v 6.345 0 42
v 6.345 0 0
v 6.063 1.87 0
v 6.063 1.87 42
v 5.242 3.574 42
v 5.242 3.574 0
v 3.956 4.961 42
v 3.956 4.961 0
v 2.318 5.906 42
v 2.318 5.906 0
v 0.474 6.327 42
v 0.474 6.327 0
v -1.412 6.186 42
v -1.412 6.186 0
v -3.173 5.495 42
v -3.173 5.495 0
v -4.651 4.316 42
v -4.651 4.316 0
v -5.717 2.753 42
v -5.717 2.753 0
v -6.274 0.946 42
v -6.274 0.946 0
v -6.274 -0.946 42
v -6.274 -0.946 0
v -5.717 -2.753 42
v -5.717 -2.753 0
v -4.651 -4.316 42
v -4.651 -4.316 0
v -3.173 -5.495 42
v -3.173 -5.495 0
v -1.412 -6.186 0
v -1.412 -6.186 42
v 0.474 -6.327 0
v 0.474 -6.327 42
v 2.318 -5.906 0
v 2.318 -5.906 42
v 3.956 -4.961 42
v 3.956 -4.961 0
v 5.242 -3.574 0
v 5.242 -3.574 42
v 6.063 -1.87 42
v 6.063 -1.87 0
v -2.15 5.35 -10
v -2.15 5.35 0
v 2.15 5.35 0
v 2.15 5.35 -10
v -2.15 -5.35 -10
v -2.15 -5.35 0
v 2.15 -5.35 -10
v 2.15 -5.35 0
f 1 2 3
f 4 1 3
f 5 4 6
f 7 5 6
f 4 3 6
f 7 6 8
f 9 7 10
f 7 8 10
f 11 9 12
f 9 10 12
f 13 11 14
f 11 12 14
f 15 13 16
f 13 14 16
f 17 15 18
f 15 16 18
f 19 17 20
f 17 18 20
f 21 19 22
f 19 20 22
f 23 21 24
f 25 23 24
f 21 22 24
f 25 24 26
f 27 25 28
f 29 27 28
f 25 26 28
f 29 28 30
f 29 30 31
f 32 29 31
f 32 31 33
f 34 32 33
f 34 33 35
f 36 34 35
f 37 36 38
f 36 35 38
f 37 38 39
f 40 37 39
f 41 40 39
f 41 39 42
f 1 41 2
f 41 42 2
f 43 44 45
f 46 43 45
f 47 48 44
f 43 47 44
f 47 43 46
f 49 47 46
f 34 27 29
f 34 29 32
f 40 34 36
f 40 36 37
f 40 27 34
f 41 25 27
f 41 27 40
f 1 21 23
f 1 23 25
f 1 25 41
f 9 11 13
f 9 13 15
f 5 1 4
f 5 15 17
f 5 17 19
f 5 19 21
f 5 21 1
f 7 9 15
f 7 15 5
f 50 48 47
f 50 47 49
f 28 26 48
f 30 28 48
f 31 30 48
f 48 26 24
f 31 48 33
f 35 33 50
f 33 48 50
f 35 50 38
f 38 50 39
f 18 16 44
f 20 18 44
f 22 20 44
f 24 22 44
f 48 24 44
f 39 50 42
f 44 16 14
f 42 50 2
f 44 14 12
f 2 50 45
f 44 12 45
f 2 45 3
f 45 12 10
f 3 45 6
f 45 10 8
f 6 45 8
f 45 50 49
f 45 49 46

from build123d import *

# Parameters (mm, degrees)
F0_R     = 6.345
F0_W     = 4.3
F0_H     = 10.7
F1_DEPTH = 42
F2_DEPTH = 10


with BuildPart() as f1:
    # F0 (on Top) → F1 (new body)
    with BuildSketch(Plane.XY):
        Circle(F0_R)
        Rectangle(F0_W, F0_H, mode=Mode.SUBTRACT)
        Rectangle(F0_W, F0_H)
    extrude(amount=F1_DEPTH)

    # F0 (on Top) → F2 (join)
    with BuildSketch(Plane.XY):
        Rectangle(F0_W, F0_H)
    extrude(amount=-F2_DEPTH)


solid = f1.part
